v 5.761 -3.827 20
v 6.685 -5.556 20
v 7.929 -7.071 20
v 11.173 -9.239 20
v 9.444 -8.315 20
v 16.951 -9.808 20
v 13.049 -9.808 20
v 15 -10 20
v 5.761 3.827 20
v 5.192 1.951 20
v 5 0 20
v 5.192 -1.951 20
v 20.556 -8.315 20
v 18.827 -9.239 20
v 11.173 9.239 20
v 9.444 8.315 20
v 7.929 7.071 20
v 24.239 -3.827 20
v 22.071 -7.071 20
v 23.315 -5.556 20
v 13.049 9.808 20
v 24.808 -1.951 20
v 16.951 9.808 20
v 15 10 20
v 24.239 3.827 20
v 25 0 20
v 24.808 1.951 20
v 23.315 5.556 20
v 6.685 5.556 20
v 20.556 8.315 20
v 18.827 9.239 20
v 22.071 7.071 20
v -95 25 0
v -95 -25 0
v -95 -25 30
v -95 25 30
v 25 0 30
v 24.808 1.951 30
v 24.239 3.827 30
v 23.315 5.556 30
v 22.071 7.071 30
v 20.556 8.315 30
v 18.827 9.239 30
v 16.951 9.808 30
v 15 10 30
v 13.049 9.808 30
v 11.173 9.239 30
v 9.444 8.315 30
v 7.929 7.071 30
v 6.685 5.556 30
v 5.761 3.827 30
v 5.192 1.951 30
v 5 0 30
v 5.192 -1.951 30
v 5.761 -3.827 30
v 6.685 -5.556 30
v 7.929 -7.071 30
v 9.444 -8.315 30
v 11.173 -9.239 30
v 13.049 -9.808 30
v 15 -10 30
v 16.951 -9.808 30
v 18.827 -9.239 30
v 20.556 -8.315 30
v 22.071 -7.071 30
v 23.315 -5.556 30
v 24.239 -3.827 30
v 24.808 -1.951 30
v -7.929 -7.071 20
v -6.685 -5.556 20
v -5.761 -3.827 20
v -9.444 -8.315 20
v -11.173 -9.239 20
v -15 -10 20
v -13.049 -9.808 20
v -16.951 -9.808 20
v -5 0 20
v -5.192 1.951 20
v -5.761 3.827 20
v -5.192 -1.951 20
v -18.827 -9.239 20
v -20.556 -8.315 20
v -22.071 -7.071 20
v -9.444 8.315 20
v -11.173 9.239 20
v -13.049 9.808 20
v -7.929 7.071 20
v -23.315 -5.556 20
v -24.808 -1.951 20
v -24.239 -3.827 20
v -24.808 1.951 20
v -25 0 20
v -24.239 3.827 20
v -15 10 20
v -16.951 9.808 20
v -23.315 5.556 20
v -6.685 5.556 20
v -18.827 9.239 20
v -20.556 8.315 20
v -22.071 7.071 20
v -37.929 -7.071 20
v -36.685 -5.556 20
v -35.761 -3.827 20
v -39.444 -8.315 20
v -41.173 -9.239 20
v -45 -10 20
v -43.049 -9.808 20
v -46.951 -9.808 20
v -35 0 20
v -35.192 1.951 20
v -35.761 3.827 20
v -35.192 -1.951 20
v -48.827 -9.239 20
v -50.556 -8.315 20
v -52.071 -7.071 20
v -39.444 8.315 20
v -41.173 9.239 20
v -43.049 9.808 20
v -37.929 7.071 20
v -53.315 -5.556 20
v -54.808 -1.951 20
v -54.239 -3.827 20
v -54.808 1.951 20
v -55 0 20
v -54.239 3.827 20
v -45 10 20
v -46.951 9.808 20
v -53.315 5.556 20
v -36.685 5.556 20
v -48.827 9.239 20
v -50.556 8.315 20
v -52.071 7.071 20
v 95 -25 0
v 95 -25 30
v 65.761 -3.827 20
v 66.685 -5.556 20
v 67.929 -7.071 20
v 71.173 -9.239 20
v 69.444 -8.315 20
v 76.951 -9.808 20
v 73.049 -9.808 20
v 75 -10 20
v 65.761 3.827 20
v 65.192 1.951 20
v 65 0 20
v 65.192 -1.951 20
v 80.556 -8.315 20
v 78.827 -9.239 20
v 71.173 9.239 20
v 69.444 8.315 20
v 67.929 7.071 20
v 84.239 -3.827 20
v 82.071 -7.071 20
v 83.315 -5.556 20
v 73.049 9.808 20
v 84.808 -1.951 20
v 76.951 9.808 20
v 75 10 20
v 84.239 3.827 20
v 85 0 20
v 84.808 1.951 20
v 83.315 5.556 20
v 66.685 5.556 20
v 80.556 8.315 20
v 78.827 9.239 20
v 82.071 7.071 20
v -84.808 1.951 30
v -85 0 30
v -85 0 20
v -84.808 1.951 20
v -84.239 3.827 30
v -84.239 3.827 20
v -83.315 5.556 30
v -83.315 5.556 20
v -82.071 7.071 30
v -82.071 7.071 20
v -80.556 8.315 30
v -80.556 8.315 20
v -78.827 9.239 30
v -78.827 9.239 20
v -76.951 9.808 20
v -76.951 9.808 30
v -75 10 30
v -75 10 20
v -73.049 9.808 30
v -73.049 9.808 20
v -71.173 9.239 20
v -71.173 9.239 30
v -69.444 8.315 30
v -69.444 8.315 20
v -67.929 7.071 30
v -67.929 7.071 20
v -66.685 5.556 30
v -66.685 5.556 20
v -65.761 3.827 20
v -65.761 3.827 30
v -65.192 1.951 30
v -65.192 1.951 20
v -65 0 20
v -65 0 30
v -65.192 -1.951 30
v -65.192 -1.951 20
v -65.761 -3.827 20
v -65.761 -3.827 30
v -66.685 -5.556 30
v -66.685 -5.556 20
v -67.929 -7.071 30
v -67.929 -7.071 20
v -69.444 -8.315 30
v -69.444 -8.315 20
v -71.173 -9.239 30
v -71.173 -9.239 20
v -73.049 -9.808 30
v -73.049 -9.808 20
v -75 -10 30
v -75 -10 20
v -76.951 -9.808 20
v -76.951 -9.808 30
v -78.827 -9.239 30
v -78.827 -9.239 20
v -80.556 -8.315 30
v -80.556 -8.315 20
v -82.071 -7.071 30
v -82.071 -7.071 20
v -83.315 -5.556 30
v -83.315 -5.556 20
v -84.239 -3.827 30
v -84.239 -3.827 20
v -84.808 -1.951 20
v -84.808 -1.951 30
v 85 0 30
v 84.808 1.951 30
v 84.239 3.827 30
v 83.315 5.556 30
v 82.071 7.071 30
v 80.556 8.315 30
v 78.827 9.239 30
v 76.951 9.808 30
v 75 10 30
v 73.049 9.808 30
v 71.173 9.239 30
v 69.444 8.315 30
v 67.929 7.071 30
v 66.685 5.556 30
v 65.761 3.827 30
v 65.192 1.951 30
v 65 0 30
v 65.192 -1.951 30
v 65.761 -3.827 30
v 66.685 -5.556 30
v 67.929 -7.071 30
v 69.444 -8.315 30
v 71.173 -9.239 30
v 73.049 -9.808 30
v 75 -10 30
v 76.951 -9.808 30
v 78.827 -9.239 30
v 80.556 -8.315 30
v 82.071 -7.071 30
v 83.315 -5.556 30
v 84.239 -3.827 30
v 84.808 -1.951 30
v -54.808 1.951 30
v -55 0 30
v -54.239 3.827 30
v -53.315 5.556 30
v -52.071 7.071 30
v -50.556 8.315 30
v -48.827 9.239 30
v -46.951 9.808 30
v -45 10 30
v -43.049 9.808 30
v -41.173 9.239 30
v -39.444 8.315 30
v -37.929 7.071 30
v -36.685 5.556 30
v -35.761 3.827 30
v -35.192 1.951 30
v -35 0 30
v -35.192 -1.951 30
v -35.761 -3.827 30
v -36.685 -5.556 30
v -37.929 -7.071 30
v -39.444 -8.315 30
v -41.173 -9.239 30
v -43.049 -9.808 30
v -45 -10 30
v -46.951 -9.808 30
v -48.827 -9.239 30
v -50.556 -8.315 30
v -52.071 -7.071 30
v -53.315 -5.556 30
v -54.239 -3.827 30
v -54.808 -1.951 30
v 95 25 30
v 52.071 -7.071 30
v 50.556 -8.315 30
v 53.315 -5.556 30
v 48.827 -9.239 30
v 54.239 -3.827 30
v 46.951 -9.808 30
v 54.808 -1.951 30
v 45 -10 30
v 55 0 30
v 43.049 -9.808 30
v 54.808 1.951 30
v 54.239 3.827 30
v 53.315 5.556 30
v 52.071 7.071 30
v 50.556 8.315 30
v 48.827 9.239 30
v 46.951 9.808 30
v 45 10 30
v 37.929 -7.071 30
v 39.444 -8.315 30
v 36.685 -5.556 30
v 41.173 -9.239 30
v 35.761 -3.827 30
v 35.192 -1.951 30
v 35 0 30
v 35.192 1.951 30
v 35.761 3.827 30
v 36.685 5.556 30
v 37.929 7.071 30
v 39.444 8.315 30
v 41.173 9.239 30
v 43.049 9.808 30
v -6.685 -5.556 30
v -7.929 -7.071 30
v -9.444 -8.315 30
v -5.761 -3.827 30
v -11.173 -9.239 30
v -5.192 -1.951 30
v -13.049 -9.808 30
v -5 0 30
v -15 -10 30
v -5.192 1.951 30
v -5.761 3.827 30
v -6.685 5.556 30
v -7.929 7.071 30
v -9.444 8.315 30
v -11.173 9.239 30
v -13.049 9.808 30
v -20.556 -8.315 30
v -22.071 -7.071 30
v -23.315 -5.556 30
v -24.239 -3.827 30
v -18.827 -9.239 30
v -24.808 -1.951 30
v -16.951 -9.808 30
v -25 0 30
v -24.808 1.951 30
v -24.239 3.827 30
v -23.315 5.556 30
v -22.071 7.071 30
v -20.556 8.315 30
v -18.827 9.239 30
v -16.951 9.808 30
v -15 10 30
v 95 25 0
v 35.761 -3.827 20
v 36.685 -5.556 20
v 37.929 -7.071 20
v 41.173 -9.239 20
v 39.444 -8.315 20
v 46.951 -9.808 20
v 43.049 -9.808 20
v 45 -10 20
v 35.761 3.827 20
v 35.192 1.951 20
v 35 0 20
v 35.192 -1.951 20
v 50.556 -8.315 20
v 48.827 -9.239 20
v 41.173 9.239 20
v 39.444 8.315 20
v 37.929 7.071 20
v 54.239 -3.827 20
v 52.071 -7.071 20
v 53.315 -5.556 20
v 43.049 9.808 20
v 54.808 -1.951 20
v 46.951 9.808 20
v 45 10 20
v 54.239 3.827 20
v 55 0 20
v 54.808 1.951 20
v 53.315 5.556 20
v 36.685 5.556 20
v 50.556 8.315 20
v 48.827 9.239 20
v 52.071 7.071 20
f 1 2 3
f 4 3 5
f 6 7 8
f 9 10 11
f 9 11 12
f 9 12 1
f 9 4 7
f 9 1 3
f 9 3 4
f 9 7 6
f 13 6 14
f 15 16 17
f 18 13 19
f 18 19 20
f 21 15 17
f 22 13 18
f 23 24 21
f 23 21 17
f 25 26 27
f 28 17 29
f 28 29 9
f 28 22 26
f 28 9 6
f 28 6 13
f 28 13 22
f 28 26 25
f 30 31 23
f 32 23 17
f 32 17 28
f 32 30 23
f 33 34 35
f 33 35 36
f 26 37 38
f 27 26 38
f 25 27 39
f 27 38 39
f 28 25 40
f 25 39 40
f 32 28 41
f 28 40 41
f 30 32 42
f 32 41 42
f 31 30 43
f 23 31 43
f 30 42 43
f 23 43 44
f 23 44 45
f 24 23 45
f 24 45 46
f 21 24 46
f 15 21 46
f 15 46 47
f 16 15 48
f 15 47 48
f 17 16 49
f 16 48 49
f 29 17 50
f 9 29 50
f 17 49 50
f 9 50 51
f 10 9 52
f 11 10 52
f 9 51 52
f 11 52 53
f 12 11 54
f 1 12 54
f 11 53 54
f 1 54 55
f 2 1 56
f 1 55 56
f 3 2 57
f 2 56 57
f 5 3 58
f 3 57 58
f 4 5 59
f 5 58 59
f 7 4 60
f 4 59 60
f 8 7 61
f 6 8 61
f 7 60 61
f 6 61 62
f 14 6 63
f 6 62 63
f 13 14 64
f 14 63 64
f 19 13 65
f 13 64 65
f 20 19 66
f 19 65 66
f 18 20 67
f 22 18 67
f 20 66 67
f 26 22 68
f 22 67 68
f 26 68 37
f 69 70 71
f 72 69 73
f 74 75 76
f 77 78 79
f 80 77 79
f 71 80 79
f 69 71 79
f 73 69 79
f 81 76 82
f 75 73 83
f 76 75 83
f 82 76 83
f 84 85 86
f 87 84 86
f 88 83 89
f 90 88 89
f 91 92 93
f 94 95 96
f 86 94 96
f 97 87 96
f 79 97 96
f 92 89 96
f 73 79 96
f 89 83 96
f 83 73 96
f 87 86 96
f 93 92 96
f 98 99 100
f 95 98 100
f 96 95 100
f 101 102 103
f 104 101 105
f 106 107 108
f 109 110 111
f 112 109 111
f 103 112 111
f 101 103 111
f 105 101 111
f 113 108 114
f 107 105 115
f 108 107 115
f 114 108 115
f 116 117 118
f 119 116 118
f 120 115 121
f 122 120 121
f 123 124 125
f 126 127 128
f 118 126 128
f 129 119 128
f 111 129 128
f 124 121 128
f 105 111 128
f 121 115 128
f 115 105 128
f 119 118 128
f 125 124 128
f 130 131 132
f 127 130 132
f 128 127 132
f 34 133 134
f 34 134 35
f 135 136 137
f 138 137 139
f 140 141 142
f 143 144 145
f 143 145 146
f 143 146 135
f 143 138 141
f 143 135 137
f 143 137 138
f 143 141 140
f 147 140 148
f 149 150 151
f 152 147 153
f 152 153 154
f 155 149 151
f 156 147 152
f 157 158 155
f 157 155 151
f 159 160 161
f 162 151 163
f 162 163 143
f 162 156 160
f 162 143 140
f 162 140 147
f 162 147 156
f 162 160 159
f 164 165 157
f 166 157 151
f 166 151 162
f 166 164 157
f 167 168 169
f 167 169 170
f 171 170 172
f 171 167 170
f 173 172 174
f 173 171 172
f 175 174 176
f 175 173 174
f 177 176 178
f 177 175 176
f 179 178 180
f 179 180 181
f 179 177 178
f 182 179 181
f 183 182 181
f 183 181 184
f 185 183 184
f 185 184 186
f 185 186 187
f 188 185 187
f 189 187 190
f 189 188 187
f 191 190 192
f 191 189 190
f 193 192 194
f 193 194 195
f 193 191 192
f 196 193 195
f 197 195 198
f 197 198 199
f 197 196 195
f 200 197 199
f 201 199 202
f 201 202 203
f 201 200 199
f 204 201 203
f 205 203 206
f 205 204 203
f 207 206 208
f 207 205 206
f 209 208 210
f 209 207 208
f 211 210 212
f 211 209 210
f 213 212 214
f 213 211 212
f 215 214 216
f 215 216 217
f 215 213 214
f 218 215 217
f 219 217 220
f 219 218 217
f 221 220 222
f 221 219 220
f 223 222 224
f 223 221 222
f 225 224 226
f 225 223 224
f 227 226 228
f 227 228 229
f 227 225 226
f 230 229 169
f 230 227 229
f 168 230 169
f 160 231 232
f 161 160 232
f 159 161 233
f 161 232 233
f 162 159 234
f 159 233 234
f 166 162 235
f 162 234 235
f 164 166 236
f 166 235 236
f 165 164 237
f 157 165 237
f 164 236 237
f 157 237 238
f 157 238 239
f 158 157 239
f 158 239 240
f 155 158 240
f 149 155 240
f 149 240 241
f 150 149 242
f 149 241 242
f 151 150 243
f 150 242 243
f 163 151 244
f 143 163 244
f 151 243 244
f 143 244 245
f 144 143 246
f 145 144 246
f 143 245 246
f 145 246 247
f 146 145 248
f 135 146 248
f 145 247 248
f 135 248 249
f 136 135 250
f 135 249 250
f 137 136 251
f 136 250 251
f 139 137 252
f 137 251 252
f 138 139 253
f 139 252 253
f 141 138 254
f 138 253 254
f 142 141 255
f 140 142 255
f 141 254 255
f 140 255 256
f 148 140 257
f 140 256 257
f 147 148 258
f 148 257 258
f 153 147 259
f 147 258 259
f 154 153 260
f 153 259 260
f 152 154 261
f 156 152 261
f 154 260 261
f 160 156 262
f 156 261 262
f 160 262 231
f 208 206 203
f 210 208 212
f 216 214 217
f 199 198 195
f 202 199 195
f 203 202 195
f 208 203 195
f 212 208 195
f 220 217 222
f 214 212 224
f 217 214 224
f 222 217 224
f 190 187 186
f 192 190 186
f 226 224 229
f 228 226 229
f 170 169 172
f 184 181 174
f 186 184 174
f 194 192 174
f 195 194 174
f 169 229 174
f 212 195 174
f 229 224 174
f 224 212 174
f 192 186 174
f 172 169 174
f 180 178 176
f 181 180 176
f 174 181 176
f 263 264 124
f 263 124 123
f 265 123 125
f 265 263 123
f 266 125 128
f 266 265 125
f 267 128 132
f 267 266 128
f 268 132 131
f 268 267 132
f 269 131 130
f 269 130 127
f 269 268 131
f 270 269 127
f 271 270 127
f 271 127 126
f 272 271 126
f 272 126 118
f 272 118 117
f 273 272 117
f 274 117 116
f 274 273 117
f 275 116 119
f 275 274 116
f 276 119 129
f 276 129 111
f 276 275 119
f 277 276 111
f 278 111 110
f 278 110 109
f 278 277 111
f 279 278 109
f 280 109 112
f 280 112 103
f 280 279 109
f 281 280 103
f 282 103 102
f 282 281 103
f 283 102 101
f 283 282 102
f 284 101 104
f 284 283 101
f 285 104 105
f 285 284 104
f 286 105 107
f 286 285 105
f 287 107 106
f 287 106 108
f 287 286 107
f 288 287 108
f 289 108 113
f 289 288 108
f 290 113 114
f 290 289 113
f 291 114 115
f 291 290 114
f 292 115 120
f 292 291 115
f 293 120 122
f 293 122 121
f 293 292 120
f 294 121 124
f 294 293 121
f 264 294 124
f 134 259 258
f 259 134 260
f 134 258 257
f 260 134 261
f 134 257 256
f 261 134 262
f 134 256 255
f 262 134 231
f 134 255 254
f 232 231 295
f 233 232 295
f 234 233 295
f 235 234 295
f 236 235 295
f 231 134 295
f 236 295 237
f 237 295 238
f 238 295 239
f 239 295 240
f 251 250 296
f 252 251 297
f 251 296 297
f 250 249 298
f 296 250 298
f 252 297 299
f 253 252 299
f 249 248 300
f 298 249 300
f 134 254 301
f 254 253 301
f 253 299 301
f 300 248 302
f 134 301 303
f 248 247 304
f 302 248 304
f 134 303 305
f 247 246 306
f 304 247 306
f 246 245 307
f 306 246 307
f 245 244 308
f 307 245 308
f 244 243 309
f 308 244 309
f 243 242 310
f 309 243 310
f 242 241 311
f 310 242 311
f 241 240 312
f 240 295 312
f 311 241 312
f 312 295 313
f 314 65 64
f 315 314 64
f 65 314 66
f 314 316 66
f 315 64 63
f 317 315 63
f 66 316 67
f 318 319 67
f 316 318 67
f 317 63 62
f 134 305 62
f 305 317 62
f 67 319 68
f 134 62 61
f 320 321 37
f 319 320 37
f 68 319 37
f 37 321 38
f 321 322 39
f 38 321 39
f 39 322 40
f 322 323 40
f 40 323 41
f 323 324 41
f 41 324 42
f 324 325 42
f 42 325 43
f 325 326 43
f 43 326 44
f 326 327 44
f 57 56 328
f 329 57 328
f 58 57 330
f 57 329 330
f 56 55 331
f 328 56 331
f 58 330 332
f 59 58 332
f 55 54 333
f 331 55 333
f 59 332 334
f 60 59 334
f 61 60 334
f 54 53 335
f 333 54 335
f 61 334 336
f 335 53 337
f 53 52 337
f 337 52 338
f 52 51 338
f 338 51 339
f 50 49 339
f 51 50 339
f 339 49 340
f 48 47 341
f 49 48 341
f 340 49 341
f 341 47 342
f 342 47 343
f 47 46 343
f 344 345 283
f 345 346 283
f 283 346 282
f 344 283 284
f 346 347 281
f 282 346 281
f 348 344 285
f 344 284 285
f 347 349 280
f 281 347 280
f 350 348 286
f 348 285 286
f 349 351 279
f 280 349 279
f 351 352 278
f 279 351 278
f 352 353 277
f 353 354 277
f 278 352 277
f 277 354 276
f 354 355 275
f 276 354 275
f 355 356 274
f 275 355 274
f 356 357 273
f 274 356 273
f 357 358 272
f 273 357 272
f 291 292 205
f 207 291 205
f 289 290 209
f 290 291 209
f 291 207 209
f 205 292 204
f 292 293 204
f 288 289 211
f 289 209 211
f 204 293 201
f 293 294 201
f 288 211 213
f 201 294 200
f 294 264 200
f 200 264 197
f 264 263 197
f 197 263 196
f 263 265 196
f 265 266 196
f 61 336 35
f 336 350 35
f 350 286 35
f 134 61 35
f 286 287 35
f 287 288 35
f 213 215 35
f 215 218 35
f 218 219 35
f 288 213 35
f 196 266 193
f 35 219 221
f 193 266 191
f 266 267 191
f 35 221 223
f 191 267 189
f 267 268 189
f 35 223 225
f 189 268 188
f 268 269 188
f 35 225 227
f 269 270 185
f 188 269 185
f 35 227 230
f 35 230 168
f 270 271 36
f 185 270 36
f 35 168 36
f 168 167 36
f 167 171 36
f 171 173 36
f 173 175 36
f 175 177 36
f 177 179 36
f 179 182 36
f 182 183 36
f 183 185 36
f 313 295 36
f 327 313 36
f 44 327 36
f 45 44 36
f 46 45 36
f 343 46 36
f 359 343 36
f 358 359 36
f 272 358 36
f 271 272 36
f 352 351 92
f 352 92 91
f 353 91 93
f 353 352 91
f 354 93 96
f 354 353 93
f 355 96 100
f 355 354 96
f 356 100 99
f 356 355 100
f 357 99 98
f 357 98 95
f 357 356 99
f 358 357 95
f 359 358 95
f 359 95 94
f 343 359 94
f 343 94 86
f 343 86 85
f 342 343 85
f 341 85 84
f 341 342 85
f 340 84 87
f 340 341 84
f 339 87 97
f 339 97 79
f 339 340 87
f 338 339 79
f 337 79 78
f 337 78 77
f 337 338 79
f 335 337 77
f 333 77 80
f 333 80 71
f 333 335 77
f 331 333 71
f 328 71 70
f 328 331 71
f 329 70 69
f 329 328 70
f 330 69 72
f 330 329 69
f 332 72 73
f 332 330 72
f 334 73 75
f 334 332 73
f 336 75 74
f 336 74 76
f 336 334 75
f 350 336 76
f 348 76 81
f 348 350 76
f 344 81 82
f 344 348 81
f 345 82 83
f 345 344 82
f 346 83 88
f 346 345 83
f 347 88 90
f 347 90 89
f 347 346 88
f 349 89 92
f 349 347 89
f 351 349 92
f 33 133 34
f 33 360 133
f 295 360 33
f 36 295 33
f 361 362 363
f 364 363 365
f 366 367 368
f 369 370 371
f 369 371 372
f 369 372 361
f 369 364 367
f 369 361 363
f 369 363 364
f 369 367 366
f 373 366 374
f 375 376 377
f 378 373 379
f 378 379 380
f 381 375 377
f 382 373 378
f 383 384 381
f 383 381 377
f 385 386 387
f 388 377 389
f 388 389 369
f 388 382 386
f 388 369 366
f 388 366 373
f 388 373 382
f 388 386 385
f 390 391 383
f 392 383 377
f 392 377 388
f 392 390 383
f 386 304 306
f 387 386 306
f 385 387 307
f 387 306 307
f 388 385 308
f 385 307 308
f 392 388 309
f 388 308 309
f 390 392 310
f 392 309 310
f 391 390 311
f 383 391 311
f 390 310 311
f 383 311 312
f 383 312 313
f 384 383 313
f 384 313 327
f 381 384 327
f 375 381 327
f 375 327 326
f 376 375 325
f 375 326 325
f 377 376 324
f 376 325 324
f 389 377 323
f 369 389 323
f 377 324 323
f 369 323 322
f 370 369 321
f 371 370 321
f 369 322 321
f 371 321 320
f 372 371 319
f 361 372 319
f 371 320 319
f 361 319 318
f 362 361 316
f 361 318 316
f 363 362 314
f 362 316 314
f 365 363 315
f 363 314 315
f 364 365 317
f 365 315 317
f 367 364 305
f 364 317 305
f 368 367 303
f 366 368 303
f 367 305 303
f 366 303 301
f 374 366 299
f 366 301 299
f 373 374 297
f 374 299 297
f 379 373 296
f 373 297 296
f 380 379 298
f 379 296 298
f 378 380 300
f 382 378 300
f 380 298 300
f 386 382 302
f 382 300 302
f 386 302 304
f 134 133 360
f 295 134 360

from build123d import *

# Parameters (mm, degrees)
F0_W     = 95
F0_H     = 50
F1_DEPTH = 30
F2_R     = 10
F3_DEPTH = 10


with BuildPart() as f1:
    # F0 (on Top) → F1 (new body)
    with BuildSketch(Plane.XY):
        with Locations((47.5, 0)):
            Rectangle(F0_W, F0_H)
    extrude(amount=F1_DEPTH)

    # F2 (on face) → F3 (cut)
    with BuildSketch(Plane.XY.offset(30)):
        with Locations((15, 0)):
            Circle(F2_R)
        with Locations((45, 0)):
            Circle(F2_R)
        with Locations((75, 0)):
            Circle(F2_R)
    extrude(amount=-F3_DEPTH, mode=Mode.SUBTRACT)

    # F4: F1 across face


with BuildPart() as f1_1:
    add(f1.part)
    add(f1.part.mirror(Plane(origin=(0, 0, 15), x_dir=(0, -1, 0), z_dir=(-1, 0, 0))))


solid = f1_1.part
